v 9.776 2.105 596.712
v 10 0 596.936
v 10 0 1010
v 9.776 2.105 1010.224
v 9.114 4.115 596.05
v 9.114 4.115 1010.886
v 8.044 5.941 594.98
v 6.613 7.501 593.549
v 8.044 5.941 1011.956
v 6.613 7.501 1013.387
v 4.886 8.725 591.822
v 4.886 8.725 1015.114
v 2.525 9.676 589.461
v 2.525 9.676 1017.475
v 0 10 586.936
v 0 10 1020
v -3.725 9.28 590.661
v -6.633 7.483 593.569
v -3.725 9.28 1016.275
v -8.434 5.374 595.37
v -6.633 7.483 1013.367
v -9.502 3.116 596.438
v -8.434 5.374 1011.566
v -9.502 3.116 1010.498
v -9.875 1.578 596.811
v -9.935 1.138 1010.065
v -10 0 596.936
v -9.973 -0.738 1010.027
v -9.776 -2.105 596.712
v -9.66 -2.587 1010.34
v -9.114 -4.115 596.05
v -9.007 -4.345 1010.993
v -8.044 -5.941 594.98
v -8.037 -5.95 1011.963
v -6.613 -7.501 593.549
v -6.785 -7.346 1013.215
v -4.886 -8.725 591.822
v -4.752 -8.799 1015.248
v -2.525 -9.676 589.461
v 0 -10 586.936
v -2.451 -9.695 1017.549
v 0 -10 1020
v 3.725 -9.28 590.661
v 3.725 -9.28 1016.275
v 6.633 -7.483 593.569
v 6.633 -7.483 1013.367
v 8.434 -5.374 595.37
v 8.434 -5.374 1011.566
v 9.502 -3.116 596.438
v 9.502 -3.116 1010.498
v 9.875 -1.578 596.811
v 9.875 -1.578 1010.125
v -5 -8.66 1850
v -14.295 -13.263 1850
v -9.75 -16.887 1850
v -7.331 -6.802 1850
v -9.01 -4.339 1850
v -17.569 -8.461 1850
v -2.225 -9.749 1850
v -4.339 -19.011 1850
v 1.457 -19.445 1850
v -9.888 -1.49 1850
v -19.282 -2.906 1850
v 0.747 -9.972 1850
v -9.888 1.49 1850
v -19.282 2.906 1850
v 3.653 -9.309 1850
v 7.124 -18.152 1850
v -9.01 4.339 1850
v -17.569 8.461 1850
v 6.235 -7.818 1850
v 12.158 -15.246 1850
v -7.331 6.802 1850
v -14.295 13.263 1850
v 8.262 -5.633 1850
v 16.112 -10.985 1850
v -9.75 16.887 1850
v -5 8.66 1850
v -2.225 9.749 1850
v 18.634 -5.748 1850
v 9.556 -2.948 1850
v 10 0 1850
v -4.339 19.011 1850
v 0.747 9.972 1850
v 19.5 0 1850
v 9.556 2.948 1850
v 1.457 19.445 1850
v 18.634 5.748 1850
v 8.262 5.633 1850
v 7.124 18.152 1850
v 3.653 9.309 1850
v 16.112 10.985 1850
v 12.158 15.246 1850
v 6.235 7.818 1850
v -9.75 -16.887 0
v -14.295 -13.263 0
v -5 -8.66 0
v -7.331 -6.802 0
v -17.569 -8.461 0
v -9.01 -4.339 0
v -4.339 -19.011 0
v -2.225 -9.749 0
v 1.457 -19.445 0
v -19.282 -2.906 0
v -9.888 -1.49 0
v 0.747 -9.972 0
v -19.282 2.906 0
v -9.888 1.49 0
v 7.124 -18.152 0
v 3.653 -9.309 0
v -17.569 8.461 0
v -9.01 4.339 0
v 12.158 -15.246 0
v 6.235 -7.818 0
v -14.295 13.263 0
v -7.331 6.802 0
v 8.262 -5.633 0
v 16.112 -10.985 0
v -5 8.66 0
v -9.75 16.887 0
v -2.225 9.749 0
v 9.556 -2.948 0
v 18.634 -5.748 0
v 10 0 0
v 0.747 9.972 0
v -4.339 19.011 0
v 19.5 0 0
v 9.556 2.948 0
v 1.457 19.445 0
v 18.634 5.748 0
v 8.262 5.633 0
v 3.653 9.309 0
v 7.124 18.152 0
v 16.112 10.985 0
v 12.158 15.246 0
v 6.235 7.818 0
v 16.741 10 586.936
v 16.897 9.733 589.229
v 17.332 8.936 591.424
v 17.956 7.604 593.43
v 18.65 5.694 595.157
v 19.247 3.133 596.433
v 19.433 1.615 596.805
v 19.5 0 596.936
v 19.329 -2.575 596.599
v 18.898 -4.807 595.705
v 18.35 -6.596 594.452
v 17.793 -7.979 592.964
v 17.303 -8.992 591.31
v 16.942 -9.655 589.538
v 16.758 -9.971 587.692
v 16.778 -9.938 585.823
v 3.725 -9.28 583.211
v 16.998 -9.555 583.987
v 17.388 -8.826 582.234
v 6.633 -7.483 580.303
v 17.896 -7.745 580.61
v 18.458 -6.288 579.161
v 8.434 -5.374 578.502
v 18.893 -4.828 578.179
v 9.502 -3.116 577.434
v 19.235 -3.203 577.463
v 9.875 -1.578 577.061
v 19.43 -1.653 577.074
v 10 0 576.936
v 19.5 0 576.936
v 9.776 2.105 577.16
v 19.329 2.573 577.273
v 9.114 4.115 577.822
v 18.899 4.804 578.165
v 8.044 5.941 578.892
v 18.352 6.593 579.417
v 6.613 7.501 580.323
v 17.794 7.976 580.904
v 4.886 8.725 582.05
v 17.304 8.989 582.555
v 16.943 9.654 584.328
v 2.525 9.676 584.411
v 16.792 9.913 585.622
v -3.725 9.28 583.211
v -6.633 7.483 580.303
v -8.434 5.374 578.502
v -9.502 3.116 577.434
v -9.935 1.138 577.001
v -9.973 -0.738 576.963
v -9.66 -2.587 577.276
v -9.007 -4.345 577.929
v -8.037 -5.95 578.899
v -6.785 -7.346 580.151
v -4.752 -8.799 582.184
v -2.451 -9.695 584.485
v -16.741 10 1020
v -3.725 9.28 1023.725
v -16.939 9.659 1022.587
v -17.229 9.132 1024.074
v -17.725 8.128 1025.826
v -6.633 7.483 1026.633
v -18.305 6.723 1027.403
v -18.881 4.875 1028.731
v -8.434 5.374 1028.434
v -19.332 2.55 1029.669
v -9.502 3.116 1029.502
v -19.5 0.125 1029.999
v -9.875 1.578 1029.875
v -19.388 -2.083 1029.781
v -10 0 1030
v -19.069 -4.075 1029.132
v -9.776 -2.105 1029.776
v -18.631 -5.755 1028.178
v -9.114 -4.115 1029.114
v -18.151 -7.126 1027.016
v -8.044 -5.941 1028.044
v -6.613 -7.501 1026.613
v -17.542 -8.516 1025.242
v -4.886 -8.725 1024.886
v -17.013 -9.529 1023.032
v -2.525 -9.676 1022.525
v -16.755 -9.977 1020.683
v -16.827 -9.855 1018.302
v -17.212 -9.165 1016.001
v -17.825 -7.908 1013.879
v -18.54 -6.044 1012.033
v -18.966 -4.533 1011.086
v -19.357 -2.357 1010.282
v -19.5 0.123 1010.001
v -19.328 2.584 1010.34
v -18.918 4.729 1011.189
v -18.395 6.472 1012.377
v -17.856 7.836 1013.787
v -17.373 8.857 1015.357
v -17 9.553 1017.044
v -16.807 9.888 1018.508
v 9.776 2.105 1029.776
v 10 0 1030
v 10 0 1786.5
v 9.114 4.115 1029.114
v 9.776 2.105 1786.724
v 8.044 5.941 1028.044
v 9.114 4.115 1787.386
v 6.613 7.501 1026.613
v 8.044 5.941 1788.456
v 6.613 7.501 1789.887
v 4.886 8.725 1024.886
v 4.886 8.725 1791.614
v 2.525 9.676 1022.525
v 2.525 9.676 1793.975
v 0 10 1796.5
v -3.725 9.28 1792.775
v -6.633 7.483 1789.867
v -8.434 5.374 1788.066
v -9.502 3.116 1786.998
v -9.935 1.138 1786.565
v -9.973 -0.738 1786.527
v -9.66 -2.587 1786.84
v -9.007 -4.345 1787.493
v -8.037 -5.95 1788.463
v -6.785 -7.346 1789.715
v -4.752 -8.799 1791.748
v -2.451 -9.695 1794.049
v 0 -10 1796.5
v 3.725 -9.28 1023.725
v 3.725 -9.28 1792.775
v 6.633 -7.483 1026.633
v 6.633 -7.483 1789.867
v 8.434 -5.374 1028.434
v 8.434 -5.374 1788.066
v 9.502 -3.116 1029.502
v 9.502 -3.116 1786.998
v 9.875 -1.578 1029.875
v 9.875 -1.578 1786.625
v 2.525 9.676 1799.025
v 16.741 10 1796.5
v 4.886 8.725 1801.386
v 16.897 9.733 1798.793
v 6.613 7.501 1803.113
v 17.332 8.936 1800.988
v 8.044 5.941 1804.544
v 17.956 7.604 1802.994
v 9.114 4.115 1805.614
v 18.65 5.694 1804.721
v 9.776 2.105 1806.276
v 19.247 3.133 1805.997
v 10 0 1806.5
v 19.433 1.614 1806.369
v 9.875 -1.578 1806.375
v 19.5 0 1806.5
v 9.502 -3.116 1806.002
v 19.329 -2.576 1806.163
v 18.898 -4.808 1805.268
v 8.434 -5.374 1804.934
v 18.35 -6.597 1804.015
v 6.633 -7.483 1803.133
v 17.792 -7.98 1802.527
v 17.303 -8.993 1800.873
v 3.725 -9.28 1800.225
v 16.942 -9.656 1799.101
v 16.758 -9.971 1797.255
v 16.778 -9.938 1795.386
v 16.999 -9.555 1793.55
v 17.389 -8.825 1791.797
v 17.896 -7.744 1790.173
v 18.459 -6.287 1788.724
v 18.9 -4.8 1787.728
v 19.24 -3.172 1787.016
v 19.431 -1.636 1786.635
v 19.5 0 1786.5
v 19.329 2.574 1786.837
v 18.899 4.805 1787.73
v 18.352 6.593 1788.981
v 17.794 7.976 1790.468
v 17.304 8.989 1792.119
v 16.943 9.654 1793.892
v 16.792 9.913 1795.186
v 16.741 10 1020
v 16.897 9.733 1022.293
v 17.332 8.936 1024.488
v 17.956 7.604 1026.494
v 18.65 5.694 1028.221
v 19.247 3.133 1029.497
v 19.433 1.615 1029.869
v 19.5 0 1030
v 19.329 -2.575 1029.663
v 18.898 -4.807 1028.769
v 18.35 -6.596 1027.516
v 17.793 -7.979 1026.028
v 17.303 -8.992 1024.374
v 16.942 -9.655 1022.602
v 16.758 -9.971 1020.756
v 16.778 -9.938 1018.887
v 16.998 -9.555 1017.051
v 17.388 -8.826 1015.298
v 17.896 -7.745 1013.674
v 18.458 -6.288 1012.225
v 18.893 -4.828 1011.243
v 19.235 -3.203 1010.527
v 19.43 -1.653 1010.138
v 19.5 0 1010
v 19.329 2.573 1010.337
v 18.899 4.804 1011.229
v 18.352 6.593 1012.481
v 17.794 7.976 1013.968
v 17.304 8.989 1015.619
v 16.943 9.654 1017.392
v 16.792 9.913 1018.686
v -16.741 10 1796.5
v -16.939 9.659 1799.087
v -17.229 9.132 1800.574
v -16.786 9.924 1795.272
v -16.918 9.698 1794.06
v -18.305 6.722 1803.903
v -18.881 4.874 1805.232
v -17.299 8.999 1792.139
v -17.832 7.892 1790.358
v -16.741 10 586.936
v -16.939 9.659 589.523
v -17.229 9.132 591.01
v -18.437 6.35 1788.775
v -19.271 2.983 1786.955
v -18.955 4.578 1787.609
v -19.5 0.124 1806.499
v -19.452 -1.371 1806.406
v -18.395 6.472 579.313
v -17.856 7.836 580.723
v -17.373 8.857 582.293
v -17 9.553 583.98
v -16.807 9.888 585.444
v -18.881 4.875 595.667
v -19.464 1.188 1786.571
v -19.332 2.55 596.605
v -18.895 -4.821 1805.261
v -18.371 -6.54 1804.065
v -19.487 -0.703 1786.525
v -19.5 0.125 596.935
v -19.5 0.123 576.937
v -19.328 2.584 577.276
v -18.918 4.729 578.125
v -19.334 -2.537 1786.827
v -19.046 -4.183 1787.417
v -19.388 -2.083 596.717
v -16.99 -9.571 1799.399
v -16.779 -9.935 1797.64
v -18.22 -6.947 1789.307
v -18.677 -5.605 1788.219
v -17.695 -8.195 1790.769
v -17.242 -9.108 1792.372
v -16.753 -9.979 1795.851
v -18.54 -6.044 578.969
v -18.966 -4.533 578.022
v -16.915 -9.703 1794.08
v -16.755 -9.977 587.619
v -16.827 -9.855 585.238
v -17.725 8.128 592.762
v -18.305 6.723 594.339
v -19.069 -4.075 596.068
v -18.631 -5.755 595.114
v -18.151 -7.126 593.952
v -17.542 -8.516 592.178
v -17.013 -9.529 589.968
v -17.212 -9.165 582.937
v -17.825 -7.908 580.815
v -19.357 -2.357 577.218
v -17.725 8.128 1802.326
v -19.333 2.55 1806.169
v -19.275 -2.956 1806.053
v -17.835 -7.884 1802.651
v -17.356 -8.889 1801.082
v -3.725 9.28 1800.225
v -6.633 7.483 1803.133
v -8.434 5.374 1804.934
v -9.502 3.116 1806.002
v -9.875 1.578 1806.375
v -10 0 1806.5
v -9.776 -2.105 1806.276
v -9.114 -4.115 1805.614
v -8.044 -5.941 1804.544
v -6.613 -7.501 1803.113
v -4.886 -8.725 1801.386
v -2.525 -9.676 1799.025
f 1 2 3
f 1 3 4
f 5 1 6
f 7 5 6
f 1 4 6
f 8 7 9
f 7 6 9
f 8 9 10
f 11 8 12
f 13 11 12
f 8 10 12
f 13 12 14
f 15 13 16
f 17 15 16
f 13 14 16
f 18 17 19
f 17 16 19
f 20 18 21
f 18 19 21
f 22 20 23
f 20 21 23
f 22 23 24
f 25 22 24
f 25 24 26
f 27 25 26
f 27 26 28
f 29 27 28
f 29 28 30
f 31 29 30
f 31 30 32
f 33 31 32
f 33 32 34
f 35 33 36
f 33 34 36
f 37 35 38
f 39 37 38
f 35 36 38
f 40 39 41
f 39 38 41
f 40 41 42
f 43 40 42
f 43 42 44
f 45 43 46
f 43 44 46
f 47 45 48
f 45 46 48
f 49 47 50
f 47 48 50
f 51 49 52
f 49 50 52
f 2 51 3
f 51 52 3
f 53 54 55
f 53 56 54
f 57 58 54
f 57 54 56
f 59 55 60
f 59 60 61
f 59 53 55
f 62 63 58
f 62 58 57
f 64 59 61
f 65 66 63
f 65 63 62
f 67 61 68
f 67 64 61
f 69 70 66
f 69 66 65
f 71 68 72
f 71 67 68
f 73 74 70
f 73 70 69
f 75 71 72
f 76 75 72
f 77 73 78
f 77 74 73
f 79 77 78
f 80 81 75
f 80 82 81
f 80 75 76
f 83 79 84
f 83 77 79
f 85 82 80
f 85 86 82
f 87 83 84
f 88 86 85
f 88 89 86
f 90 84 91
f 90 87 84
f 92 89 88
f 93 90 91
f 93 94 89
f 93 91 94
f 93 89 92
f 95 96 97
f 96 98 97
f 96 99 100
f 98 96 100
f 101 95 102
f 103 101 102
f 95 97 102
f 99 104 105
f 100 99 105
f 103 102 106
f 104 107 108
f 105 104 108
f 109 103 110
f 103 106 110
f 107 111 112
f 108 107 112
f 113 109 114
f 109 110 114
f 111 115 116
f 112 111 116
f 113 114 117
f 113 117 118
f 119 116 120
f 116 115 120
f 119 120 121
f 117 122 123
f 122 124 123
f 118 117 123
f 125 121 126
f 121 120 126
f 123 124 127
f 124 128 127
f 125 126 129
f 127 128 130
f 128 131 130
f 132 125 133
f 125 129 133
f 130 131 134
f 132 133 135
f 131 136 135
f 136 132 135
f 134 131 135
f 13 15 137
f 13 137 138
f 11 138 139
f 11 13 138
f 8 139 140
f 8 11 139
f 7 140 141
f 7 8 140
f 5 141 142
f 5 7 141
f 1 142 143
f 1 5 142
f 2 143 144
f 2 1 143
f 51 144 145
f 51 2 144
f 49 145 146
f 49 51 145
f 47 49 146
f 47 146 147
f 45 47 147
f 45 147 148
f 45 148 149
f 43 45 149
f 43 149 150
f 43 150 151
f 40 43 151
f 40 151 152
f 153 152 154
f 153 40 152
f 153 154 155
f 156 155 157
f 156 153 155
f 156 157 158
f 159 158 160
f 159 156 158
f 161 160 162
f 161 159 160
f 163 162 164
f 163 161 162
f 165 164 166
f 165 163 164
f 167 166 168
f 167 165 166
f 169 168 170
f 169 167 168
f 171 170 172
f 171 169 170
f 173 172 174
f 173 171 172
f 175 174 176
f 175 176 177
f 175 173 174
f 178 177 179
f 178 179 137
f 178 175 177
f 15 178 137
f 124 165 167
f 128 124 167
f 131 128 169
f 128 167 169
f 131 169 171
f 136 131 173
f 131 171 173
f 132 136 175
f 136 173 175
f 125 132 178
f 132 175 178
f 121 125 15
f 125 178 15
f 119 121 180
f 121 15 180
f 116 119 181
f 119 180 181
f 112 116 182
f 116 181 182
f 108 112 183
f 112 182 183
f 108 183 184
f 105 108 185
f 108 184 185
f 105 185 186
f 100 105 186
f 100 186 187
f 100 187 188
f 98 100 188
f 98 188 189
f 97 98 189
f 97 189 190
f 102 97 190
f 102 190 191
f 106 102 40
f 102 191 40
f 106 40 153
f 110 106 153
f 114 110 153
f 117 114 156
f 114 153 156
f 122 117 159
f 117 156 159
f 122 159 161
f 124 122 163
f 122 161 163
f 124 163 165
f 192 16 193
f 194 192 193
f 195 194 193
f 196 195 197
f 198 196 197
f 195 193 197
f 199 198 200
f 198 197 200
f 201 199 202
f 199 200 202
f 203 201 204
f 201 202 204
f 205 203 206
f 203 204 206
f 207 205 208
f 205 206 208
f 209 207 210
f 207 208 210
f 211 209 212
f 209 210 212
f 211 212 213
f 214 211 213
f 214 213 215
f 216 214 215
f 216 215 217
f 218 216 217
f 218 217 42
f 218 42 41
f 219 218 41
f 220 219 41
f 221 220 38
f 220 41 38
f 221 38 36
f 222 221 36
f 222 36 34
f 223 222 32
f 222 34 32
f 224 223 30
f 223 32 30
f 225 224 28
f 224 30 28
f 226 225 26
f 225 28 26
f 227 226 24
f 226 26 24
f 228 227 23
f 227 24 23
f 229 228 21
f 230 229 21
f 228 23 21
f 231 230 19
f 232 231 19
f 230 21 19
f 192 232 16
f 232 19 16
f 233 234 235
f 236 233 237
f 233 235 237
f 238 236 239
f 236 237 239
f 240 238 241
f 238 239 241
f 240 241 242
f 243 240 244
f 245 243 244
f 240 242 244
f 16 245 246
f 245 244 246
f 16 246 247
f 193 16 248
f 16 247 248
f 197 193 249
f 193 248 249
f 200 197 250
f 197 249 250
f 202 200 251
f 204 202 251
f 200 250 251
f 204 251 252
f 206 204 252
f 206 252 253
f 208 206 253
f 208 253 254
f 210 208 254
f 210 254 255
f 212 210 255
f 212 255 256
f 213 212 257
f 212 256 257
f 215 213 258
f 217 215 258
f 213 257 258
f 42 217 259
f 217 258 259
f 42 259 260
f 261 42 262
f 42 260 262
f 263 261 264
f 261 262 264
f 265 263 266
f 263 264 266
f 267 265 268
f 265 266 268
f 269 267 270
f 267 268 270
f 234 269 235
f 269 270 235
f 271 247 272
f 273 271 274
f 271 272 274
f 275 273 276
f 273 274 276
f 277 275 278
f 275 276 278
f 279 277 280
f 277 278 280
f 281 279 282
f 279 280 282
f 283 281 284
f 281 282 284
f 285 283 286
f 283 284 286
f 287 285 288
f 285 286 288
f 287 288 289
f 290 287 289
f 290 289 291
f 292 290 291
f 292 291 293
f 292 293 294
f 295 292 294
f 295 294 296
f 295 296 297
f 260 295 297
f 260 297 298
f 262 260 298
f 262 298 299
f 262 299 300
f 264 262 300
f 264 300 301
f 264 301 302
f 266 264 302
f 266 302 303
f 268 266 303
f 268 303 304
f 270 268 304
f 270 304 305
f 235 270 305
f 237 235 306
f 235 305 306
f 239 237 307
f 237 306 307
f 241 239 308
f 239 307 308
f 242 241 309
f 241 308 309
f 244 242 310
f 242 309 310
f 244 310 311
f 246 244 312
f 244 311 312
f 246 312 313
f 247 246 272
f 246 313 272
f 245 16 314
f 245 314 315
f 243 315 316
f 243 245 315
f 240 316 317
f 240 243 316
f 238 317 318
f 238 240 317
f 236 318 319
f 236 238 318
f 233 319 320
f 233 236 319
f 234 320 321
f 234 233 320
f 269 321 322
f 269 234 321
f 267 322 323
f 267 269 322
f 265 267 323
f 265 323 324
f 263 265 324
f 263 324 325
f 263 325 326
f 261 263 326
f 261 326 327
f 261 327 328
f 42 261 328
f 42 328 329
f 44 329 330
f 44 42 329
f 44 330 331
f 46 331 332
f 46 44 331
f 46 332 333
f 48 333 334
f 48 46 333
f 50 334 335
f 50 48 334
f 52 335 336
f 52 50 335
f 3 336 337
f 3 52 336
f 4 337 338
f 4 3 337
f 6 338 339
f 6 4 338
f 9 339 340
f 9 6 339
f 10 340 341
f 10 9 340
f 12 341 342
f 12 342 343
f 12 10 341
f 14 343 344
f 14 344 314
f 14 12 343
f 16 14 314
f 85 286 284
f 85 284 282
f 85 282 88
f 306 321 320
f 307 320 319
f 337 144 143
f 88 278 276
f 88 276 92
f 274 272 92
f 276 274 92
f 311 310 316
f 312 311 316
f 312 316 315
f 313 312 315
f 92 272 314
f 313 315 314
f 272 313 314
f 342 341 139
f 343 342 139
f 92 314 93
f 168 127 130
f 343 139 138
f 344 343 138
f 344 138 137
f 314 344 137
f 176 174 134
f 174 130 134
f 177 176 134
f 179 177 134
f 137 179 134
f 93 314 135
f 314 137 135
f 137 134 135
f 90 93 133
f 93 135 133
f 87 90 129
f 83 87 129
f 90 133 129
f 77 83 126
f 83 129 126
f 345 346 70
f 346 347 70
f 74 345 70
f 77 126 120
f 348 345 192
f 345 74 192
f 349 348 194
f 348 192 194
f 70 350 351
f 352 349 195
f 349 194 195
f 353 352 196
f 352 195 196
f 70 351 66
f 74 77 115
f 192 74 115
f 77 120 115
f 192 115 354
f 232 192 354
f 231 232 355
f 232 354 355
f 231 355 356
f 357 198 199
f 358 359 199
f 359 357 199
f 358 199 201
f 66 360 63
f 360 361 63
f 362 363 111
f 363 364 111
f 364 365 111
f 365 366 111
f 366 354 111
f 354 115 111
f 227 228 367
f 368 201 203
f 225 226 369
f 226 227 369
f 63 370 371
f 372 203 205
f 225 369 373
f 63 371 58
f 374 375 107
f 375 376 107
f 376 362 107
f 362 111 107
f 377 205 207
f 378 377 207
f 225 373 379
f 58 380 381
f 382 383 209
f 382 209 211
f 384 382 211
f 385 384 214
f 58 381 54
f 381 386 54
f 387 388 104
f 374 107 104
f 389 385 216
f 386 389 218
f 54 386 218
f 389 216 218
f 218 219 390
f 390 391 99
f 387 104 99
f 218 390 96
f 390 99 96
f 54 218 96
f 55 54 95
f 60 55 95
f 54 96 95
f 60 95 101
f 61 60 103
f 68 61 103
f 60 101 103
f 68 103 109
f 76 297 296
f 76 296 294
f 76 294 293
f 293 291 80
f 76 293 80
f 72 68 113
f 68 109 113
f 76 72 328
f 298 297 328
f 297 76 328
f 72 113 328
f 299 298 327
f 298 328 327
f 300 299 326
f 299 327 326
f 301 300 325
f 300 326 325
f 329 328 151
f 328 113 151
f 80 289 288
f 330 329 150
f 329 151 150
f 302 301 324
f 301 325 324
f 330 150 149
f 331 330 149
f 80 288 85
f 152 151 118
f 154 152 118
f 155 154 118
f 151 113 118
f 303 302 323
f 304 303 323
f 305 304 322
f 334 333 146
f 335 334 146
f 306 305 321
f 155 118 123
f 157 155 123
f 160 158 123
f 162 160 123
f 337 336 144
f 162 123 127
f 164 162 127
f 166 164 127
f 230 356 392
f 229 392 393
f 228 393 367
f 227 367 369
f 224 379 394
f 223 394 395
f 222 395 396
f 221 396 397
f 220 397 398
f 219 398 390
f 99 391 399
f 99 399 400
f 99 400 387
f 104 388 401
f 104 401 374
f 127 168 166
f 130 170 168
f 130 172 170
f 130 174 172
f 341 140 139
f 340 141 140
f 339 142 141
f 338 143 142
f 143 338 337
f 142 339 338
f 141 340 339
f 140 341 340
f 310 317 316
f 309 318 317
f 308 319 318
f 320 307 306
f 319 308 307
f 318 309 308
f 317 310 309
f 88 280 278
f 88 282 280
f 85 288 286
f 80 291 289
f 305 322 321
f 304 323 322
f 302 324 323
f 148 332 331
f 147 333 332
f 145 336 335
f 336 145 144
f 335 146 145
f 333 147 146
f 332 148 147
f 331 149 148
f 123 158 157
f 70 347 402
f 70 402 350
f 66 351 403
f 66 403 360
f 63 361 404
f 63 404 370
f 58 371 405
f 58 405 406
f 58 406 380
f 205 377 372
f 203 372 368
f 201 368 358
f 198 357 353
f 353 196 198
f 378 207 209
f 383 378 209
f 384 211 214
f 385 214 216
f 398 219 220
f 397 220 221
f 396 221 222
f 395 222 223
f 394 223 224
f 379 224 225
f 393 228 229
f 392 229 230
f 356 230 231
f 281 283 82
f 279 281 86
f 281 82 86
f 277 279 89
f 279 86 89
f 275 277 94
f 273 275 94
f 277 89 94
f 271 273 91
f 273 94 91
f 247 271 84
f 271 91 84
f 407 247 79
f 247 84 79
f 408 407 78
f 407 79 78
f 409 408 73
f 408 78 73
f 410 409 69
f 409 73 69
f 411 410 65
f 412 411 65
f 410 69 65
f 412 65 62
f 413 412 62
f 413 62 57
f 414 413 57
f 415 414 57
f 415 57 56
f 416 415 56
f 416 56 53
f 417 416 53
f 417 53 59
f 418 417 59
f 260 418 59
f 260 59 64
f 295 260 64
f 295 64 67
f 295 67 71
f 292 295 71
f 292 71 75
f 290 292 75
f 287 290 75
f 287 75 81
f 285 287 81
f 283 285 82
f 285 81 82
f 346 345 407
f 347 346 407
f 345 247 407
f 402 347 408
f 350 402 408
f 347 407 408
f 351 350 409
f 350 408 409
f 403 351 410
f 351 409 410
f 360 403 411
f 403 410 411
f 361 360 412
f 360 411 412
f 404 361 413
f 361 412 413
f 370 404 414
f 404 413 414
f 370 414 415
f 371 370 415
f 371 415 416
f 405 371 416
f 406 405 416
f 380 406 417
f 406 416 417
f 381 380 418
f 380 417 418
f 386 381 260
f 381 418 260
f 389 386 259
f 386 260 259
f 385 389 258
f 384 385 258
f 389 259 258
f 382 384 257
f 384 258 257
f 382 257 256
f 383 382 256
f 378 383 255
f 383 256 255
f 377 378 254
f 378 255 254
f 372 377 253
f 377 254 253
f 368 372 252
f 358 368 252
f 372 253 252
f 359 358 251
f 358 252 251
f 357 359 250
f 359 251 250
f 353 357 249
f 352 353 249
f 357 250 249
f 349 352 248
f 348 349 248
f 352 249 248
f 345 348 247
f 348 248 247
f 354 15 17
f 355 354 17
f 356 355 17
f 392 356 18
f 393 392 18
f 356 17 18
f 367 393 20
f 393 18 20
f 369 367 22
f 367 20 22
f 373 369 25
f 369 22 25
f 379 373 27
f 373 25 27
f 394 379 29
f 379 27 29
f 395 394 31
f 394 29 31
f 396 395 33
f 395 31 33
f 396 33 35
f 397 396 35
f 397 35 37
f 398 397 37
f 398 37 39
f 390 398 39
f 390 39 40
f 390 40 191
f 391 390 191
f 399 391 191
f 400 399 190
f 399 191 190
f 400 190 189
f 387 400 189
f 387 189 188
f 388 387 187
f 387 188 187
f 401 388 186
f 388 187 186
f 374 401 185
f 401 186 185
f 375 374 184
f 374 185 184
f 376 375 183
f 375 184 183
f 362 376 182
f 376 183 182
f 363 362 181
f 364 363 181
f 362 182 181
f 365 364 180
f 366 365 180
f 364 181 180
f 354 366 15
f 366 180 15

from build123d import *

# Parameters (mm, degrees)
SKETCH_R        = 19.5
PAD_DEPTH       = 1850
SKETCH001_R     = 10
POCKET_DEPTH    = 1850
SKETCH002_R     = 10
POCKET001_DEPTH = 25


with BuildPart() as part:
    # Sketch → Pad (new body)
    with BuildSketch(Plane.XY):
        Circle(SKETCH_R)
    extrude(amount=PAD_DEPTH)

    # Sketch001 (on Face3 of Pad) → Pocket (cut)
    with BuildSketch(Plane.XY.offset(1850)):
        Circle(SKETCH001_R)
    extrude(amount=-POCKET_DEPTH, mode=Mode.SUBTRACT)

    # Sketch002 → Pocket001 (cut, symmetric)
    with BuildSketch(Plane.YZ):
        with Locations((0, 1020)):
            Circle(SKETCH002_R)
        with Locations((0, 586.936)):
            Circle(SKETCH002_R)
        with Locations((0, 1796.5)):
            Circle(SKETCH002_R)
    extrude(amount=POCKET001_DEPTH, both=True, mode=Mode.SUBTRACT)


solid = part.part
